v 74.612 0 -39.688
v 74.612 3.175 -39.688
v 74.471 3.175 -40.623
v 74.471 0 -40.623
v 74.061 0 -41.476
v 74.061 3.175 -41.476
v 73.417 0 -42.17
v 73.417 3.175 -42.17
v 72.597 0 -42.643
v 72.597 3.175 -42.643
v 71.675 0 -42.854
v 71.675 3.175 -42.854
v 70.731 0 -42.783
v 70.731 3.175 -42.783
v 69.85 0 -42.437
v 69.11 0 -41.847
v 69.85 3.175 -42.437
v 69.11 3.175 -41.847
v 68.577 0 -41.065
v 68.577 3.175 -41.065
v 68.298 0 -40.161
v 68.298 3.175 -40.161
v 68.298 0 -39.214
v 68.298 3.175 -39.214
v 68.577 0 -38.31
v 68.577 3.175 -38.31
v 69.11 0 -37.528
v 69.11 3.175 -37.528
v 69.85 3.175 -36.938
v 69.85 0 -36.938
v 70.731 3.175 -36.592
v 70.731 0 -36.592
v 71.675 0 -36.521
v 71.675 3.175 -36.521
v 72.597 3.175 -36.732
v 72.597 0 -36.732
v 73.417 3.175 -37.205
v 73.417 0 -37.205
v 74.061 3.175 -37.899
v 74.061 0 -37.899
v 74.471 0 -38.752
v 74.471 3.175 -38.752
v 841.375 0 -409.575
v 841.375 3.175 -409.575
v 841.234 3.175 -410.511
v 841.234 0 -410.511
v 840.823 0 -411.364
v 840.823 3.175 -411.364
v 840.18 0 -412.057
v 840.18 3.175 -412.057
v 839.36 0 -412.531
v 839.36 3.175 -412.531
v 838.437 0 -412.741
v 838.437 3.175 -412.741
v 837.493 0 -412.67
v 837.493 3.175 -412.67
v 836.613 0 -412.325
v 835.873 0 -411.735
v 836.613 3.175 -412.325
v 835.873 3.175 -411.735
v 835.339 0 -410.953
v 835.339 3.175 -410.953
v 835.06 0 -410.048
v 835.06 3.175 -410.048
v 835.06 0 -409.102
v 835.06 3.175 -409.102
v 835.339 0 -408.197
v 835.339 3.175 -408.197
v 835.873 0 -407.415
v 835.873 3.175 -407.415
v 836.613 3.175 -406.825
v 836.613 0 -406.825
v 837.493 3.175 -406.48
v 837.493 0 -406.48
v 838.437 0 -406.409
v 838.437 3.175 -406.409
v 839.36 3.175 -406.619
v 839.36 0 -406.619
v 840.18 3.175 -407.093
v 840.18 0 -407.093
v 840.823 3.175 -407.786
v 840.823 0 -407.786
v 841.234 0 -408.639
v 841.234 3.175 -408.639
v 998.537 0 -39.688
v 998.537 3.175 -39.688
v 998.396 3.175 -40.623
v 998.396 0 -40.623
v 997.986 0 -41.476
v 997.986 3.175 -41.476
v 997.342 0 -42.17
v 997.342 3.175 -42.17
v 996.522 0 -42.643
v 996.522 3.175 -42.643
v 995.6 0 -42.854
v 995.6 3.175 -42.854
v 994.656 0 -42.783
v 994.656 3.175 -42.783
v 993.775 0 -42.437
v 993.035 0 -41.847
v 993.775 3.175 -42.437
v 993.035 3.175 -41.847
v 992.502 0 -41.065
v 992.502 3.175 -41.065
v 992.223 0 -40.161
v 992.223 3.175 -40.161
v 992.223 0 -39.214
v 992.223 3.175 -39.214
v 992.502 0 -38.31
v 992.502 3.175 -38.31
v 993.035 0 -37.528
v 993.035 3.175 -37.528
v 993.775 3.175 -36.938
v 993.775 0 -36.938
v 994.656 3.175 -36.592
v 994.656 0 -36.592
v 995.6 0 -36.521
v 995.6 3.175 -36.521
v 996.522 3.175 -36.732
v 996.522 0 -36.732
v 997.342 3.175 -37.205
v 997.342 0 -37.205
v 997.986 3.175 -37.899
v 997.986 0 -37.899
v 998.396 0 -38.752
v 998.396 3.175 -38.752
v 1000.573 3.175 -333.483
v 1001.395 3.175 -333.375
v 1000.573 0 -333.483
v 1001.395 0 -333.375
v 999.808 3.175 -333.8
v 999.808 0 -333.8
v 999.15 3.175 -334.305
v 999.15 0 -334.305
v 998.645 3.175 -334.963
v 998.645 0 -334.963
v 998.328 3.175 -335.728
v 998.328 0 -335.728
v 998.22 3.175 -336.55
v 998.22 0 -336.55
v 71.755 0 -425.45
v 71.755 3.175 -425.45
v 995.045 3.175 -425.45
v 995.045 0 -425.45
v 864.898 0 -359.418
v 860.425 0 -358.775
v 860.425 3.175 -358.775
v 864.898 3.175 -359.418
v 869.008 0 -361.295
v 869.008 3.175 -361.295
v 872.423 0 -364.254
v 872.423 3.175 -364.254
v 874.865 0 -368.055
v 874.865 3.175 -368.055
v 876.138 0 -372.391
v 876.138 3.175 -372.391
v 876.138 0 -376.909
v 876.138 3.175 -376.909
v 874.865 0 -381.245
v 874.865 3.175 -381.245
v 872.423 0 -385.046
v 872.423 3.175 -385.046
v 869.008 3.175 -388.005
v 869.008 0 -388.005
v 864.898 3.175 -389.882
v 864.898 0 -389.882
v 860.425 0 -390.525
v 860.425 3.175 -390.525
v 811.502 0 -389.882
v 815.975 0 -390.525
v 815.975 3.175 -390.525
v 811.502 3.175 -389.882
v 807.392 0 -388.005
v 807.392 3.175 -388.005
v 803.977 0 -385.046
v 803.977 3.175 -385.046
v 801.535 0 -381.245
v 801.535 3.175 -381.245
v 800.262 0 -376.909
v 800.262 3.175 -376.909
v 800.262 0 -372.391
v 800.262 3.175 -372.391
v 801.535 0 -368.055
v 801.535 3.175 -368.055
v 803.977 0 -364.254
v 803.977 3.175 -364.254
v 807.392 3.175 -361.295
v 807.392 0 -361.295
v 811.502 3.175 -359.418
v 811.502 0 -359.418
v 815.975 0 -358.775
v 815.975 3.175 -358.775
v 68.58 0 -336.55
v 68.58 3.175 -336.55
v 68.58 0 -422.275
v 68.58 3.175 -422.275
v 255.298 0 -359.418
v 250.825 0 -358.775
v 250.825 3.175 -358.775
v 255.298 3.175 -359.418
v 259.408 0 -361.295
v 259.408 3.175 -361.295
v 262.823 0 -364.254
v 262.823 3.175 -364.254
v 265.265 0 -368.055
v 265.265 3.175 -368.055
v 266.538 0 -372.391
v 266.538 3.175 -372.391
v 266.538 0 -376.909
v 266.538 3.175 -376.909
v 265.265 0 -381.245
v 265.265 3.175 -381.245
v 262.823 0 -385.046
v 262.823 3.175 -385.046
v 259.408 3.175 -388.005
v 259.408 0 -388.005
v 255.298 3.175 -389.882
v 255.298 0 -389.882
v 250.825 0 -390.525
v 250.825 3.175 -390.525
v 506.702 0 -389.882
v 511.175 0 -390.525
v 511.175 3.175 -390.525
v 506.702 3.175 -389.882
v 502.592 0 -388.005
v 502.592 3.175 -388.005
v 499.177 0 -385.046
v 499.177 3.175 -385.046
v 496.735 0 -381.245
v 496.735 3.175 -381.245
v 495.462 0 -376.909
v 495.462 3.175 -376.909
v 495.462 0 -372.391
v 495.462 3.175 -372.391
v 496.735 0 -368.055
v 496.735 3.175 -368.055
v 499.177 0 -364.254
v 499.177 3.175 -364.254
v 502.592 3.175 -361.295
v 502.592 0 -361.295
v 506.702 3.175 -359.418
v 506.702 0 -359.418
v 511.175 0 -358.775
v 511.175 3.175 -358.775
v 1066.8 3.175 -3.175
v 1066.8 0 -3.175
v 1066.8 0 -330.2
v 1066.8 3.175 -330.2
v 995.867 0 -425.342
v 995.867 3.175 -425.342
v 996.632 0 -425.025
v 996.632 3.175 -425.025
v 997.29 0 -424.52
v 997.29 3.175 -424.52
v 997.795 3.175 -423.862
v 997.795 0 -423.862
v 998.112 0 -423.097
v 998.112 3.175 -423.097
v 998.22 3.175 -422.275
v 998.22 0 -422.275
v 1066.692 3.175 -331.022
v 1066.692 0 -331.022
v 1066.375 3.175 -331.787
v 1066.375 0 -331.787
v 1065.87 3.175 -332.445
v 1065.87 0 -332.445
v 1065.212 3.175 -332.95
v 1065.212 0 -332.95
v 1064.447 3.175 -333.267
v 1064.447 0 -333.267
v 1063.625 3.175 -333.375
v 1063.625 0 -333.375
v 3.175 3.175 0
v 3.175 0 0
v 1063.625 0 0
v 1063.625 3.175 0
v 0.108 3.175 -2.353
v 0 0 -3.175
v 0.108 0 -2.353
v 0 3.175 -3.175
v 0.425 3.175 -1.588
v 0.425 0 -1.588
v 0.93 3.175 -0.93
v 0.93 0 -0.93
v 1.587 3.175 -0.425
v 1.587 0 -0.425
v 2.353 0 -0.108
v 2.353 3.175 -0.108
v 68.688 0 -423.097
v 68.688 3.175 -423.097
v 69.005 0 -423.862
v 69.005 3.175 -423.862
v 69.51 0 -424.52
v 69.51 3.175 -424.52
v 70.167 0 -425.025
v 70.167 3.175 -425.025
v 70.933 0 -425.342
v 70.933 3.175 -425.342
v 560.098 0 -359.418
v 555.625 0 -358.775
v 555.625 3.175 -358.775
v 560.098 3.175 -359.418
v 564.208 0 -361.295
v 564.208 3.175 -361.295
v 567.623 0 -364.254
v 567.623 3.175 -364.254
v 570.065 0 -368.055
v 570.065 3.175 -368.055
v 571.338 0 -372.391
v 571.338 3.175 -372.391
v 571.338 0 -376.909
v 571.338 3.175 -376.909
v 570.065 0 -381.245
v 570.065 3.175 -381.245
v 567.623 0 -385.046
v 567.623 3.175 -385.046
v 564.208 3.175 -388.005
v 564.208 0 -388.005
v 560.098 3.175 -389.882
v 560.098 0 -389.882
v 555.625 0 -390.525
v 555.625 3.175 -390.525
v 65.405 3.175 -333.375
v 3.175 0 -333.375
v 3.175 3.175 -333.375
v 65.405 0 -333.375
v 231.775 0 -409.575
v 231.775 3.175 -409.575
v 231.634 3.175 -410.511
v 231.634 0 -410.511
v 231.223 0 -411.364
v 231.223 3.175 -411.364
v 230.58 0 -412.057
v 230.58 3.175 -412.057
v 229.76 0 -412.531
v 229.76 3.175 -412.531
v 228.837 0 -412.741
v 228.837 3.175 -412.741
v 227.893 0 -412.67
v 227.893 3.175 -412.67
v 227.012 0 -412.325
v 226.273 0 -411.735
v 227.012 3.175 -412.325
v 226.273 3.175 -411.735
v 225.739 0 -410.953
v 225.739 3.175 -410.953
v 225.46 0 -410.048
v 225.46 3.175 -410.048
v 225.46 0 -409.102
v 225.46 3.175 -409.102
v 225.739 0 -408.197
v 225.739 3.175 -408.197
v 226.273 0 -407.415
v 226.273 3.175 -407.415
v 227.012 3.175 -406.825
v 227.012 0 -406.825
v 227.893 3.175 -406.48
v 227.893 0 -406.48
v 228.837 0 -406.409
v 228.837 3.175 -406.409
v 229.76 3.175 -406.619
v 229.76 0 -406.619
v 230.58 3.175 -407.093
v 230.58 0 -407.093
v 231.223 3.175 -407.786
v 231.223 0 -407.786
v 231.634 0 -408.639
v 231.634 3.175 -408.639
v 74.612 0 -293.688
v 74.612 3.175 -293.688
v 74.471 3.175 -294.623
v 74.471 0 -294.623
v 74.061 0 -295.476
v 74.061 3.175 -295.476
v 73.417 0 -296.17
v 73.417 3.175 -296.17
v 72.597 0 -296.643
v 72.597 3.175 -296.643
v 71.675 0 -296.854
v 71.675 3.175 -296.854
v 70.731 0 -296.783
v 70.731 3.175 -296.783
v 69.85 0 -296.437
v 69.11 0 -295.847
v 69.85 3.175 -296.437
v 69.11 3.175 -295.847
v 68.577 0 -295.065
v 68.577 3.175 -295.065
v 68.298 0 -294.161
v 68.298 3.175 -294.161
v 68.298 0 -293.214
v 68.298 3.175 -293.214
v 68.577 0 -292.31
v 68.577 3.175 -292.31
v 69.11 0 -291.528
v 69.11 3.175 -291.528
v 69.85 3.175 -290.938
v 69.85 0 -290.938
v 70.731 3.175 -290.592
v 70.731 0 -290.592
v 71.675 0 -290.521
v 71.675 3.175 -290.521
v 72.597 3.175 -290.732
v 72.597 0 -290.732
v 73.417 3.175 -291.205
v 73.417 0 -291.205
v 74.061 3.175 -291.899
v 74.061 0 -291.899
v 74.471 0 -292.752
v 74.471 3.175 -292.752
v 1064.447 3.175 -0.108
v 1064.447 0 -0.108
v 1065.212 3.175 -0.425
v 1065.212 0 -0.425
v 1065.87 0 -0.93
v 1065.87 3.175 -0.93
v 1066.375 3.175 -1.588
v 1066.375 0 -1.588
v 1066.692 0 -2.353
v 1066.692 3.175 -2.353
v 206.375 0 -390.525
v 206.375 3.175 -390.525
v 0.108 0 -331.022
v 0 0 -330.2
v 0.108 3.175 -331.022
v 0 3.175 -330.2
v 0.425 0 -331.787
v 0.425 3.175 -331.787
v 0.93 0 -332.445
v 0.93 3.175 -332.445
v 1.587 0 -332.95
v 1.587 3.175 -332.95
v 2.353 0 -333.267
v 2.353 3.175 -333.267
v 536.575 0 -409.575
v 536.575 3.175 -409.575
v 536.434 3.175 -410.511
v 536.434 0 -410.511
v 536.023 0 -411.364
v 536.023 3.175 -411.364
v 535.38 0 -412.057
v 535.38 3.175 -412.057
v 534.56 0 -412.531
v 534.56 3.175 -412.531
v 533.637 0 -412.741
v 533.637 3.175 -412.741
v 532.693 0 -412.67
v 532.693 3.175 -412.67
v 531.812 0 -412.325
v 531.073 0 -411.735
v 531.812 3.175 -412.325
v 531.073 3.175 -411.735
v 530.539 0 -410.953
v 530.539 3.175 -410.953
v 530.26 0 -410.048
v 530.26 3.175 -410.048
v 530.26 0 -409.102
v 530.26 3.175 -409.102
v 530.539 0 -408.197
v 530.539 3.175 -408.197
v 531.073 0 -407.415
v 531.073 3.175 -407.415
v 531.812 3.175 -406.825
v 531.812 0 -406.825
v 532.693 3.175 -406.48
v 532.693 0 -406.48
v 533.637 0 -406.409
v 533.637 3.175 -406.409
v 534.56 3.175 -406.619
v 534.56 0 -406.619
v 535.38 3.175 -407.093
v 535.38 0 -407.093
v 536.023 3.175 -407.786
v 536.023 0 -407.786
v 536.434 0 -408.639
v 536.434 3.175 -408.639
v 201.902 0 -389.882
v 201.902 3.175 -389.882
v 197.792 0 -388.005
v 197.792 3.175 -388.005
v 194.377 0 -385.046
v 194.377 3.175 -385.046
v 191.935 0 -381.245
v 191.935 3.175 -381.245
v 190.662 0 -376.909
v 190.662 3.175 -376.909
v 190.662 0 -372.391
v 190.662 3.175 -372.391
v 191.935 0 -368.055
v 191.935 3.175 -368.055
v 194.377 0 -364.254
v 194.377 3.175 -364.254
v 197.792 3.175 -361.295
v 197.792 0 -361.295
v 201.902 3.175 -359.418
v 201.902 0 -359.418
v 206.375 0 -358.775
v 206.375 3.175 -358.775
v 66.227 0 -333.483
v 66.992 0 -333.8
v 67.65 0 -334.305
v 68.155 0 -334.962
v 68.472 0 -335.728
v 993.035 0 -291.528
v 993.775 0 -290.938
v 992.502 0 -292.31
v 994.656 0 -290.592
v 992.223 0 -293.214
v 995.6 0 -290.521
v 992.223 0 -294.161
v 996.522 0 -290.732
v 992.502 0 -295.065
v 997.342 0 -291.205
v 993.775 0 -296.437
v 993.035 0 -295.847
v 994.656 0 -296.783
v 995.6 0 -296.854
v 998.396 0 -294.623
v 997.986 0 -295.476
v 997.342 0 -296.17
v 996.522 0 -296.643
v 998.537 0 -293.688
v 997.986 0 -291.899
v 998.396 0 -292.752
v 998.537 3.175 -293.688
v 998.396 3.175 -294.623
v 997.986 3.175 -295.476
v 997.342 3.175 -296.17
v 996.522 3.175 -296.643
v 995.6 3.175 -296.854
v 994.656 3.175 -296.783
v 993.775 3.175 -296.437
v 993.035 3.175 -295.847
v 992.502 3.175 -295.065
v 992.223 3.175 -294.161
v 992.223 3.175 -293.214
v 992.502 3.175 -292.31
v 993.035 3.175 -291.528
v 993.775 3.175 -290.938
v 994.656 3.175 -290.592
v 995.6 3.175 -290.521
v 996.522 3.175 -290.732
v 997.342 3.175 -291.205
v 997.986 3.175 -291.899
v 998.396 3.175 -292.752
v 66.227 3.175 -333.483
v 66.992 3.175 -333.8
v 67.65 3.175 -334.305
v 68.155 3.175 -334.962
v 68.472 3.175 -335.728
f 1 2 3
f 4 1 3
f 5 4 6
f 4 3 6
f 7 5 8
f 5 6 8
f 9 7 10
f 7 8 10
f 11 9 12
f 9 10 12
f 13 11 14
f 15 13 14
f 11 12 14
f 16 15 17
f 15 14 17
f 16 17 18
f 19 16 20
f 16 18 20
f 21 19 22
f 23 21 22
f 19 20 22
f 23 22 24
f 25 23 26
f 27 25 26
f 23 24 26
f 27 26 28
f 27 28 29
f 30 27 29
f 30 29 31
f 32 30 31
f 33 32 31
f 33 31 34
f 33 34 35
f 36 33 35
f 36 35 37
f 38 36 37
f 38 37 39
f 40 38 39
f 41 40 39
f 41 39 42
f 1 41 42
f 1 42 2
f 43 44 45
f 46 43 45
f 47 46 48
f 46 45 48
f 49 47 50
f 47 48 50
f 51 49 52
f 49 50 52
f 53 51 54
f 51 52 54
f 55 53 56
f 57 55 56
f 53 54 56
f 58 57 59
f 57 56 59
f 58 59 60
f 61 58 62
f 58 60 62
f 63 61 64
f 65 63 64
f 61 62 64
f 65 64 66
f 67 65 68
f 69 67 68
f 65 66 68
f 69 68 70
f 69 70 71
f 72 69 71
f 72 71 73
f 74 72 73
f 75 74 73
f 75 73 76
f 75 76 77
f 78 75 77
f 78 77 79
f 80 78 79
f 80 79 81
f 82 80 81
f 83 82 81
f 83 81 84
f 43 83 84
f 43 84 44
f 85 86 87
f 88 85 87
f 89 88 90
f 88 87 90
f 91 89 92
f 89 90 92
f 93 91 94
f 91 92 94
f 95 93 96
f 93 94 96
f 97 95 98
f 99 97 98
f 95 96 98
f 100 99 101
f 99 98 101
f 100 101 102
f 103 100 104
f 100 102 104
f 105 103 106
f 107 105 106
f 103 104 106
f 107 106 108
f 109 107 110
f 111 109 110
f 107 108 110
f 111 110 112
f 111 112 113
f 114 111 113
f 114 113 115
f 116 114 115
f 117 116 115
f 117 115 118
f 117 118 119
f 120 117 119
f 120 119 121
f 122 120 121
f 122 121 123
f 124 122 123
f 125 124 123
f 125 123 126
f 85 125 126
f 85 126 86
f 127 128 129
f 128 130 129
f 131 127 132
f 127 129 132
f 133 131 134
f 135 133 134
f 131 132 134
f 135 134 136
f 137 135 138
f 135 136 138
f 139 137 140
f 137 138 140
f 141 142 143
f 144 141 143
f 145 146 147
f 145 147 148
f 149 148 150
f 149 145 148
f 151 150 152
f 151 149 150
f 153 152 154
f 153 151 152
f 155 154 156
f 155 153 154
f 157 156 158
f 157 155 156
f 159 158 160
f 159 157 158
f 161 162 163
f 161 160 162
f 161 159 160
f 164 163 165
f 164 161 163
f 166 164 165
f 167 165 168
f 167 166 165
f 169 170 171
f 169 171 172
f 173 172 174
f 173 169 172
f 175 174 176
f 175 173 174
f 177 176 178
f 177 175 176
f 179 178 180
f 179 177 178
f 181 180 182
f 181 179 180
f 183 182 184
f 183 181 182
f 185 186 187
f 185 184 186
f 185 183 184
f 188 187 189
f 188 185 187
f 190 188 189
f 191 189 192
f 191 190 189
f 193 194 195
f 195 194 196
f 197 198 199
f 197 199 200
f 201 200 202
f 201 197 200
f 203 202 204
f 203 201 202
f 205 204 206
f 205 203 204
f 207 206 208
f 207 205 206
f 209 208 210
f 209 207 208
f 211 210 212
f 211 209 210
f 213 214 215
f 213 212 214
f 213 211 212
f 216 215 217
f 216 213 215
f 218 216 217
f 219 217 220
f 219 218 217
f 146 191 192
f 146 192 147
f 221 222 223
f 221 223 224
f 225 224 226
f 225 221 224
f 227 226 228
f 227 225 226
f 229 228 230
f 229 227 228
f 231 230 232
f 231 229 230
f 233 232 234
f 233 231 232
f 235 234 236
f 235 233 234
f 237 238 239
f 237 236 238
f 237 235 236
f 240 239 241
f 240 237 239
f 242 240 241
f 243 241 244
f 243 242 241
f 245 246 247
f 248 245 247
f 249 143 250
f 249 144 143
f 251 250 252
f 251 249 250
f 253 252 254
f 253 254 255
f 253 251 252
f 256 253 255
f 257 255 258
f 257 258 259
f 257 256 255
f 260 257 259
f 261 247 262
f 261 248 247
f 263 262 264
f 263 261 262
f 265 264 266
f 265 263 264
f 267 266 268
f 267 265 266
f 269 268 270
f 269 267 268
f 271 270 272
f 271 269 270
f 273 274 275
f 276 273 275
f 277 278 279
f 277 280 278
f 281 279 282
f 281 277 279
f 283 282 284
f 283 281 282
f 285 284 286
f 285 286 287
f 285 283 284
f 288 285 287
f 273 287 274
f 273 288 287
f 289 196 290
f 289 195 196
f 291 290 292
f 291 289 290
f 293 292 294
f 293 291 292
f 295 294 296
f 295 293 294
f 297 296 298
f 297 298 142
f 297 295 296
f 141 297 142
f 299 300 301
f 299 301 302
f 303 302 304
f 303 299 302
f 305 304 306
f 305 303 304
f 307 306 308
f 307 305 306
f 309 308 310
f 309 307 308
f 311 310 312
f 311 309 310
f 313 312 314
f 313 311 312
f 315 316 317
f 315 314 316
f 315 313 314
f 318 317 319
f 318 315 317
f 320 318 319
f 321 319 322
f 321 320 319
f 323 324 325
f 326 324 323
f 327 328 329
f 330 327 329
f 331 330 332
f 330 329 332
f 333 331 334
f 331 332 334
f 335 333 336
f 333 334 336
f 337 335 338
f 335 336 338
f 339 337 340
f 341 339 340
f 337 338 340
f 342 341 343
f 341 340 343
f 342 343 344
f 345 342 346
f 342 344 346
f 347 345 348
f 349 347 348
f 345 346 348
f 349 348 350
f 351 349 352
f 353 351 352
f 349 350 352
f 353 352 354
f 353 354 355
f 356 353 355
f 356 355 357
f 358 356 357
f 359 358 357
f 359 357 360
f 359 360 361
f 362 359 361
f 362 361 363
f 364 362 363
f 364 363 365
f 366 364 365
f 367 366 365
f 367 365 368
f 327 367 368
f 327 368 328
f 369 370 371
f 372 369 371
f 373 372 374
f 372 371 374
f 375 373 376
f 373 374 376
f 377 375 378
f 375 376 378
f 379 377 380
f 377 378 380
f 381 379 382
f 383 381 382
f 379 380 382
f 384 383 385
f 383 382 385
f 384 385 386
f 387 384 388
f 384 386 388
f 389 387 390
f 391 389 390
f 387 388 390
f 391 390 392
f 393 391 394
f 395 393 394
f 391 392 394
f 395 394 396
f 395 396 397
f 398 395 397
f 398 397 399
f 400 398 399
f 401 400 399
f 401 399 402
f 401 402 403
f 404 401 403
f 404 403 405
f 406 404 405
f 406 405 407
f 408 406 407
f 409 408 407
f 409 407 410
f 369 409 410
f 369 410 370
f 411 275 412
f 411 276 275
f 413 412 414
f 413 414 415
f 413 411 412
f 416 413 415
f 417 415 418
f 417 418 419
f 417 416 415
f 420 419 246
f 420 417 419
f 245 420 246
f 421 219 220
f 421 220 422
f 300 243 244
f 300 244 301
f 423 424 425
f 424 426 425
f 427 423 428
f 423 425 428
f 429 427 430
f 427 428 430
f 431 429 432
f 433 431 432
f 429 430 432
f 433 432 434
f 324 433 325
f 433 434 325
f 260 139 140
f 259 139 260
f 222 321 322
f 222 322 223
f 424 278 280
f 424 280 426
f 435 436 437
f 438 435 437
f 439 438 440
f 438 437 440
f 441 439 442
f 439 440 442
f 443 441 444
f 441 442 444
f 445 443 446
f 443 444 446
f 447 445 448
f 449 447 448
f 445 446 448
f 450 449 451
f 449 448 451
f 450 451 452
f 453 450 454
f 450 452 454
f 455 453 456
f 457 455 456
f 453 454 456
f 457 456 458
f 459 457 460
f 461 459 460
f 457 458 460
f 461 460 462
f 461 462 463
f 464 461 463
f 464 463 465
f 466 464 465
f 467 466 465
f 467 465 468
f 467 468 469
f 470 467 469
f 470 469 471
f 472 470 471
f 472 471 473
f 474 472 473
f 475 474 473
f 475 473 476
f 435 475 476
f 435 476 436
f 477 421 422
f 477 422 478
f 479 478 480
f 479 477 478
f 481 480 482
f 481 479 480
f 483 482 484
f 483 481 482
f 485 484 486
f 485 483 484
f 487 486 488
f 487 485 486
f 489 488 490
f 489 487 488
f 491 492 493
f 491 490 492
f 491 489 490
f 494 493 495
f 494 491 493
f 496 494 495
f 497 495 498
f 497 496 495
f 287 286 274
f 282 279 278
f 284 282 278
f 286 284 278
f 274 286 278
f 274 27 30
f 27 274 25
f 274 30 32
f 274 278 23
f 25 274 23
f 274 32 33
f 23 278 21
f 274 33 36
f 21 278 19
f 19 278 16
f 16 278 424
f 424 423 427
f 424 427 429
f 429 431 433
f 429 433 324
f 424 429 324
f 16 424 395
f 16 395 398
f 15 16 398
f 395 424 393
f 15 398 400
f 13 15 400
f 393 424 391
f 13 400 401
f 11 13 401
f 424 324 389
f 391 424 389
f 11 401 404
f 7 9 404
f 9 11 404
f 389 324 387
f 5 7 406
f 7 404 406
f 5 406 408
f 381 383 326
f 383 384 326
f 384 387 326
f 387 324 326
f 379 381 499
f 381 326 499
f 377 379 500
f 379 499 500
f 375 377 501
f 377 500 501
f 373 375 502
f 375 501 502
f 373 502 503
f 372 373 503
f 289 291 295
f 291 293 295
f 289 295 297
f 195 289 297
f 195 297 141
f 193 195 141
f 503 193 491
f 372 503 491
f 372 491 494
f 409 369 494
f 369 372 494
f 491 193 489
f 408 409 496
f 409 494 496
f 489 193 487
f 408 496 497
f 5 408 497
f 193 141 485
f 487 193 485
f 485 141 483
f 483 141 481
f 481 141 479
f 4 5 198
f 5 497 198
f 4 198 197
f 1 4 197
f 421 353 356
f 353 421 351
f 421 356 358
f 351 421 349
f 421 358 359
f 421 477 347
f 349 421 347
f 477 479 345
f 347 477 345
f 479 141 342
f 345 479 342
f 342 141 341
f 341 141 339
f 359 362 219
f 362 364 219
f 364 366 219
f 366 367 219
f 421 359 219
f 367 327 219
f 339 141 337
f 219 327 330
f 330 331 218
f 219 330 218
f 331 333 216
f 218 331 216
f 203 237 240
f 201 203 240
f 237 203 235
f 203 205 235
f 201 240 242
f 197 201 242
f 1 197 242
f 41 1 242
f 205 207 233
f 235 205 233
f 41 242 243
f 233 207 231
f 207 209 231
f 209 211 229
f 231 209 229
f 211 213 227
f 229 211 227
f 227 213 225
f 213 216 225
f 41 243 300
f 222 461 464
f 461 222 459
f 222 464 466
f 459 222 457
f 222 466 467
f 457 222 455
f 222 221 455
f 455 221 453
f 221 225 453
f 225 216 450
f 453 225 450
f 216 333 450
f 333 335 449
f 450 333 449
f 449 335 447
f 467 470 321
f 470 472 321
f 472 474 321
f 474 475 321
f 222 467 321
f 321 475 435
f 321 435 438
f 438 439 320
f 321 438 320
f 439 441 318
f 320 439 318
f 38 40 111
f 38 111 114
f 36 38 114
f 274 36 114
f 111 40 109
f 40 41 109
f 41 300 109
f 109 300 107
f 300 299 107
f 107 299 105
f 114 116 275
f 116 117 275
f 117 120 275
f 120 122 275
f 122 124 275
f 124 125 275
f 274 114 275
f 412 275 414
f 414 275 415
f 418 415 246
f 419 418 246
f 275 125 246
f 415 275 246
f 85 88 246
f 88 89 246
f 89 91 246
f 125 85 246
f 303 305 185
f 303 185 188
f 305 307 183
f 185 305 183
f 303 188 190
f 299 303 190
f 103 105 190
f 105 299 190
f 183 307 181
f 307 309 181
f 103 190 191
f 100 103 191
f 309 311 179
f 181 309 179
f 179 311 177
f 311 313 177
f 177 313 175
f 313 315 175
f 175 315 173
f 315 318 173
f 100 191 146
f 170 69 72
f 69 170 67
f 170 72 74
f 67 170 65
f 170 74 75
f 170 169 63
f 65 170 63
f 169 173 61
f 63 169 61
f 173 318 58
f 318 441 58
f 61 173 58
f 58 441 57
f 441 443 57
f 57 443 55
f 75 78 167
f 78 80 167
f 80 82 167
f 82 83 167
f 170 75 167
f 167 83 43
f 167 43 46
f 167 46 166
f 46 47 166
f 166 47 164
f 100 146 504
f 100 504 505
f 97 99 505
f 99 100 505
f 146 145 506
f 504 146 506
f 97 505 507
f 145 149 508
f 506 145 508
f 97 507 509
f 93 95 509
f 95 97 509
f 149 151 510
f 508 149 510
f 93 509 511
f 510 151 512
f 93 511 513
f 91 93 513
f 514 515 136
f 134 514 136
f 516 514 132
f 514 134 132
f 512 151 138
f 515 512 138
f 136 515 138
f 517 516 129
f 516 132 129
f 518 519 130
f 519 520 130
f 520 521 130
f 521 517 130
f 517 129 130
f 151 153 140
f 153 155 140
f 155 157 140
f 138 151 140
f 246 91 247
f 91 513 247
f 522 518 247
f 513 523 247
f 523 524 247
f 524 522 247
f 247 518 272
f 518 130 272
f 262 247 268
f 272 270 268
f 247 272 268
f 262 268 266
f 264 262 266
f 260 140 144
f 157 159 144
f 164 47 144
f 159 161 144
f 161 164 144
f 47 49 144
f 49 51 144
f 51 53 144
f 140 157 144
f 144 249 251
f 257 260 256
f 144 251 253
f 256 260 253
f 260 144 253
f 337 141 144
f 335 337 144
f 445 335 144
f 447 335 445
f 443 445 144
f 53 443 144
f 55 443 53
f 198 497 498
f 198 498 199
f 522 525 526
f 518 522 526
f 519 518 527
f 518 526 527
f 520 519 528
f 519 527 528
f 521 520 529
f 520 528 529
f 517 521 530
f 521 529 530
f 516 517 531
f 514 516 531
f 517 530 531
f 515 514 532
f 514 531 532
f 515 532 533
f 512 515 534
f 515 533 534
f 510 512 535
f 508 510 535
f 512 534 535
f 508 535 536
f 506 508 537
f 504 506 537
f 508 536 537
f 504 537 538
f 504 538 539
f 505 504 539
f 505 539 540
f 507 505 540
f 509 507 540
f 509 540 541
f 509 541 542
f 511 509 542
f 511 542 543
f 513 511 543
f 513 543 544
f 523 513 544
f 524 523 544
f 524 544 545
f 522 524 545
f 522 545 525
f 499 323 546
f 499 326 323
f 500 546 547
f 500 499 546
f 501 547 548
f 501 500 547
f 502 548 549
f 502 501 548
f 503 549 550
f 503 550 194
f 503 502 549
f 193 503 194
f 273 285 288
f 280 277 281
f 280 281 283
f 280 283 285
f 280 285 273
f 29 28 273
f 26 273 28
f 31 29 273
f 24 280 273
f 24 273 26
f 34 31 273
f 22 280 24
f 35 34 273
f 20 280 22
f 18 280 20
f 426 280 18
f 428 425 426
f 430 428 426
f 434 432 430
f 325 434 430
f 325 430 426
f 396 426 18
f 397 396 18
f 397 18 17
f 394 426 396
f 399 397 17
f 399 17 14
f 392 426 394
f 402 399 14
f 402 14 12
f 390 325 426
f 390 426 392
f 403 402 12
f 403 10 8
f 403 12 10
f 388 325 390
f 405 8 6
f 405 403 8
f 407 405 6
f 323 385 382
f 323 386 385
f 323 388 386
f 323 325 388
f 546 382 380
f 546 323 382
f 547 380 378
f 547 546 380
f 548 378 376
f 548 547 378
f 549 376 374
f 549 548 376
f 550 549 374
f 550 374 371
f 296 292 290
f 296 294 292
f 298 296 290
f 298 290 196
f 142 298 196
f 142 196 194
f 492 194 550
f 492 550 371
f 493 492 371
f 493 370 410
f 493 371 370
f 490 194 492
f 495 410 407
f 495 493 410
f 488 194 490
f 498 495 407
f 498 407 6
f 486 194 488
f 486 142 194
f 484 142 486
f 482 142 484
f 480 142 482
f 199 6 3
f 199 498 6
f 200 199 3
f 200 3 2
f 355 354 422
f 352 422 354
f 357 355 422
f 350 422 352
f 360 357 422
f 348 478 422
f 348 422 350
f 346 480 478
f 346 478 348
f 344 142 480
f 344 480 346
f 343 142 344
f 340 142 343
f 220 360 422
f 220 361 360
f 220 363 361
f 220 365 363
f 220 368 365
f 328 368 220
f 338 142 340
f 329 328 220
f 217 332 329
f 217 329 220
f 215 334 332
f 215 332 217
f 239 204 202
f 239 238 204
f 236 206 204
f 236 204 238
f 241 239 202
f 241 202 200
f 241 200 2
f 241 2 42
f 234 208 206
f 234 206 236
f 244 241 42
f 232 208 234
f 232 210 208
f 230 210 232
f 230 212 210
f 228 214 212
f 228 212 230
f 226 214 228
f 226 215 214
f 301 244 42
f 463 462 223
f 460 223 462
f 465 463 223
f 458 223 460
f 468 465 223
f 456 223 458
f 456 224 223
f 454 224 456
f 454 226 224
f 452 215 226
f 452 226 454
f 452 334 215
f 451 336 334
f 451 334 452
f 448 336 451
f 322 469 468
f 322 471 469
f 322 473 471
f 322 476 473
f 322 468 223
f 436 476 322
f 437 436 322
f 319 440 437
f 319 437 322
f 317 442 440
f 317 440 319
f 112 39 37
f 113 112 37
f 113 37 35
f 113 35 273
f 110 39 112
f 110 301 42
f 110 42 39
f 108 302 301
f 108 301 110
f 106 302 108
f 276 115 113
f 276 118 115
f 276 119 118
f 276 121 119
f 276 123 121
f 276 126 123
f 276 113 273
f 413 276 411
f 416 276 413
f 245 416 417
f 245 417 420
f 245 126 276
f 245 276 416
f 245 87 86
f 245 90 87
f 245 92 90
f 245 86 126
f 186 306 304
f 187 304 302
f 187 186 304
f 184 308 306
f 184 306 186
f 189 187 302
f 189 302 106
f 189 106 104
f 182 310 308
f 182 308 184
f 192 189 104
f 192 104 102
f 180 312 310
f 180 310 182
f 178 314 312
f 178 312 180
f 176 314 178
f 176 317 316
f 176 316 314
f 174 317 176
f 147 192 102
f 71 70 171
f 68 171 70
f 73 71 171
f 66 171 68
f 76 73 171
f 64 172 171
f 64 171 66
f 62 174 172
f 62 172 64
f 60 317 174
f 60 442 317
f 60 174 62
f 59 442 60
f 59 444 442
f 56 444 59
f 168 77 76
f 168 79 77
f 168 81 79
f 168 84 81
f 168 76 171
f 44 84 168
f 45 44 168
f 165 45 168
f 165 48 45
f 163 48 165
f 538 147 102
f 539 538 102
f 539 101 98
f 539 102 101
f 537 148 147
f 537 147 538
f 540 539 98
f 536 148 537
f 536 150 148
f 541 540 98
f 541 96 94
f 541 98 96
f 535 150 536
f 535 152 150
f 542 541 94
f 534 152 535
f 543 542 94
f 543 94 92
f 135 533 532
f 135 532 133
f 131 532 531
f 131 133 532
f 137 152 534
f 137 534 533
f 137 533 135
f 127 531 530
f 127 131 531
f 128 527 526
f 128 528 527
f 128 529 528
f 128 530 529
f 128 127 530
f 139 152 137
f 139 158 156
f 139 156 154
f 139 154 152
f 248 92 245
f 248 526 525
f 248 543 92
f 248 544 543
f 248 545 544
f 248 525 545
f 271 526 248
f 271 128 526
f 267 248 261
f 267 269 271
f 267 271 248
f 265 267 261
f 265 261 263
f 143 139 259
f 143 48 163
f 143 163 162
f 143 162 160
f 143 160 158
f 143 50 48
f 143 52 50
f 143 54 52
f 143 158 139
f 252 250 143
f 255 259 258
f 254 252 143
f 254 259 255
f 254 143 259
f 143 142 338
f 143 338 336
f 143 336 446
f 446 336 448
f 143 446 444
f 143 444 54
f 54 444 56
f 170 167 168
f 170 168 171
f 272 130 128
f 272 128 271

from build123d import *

# Parameters (mm, degrees)
SKETCH1_W                   = 1066.8
SKETCH1_H                   = 333.375
BOSS_EXTRUDE1_DEPTH         = 3.175
SKETCH2_W                   = 929.64
SKETCH2_H                   = 92.075
BOSS_EXTRUDE2_DEPTH         = 3.175
F_1_4_0_25_DIAMETER_HOLE1_D = 6.35
FILLET1_R                   = 3.175
CUT_EXTRUDE1_DEPTH          = 4.175


with BuildPart() as part:
    # Sketch1 → Boss-Extrude1 (new body)
    with BuildSketch(Plane(origin=(0, 0, 0), x_dir=(1, 0, 0), z_dir=(0, 1, 0))):
        with Locations((533.4, 166.6875)):
            Rectangle(SKETCH1_W, SKETCH1_H)
    extrude(amount=BOSS_EXTRUDE1_DEPTH)

    # Sketch2 → Boss-Extrude2 (add)
    with BuildSketch(Plane(origin=(0, 3.175, 0), x_dir=(1, 0, 0), z_dir=(0, 1, 0))):
        with Locations((533.4, 379.4125)):
            Rectangle(SKETCH2_W, SKETCH2_H)
    extrude(amount=-BOSS_EXTRUDE2_DEPTH)

    # 1/4 (0.25) Diameter Hole1 (through all)
    with Locations(Plane(origin=(0, 0, 0), x_dir=(-1, 0, 0), z_dir=(0, -1, 0))):
        with Locations((-71.4375, 39.6875), (-228.6, 409.575), (-533.4, 409.575), (-838.2, 409.575), (-995.3625, 293.6875), (-995.3625, 39.6875), (-71.4375, 293.6875)):
            Hole(F_1_4_0_25_DIAMETER_HOLE1_D / 2)

    # Fillet1
    fillet1_edges = [part.edges().sort_by_distance(p)[0] for p in [
        (998.22, 1.5875, -333.375),
        (998.22, 1.5875, -425.45),
        (68.58, 1.5875, -425.45),
        (68.58, 1.5875, -333.375),
        (0, 1.5875, -333.375),
        (1066.8, 1.5875, -333.375),
        (1066.8, 1.5875, 0),
        (0, 1.5875, 0),
    ]]
    fillet(fillet1_edges, radius=FILLET1_R)

    # Sketch9 → Cut-Extrude1 (cut, through all)
    with BuildSketch(Plane.XZ):
        with BuildLine():
            Line((860.425, -390.525), (815.975, -390.525))
            ThreePointArc((815.975, -390.525), (800.1, -374.65), (815.975, -358.775))
            Line((815.975, -358.775), (860.425, -358.775))
            ThreePointArc((860.425, -358.775), (876.3, -374.65), (860.425, -390.525))
        make_face()
        with BuildLine():
            Line((555.625, -390.525), (511.175, -390.525))
            ThreePointArc((511.175, -390.525), (495.3, -374.65), (511.175, -358.775))
            Line((511.175, -358.775), (555.625, -358.775))
            ThreePointArc((555.625, -358.775), (571.5, -374.65), (555.625, -390.525))
        make_face()
        with BuildLine():
            Line((250.825, -390.525), (206.375, -390.525))
            ThreePointArc((206.375, -390.525), (190.5, -374.65), (206.375, -358.775))
            Line((206.375, -358.775), (250.825, -358.775))
            ThreePointArc((250.825, -358.775), (266.7, -374.65), (250.825, -390.525))
        make_face()
    extrude(amount=-CUT_EXTRUDE1_DEPTH, mode=Mode.SUBTRACT)


solid = part.part
